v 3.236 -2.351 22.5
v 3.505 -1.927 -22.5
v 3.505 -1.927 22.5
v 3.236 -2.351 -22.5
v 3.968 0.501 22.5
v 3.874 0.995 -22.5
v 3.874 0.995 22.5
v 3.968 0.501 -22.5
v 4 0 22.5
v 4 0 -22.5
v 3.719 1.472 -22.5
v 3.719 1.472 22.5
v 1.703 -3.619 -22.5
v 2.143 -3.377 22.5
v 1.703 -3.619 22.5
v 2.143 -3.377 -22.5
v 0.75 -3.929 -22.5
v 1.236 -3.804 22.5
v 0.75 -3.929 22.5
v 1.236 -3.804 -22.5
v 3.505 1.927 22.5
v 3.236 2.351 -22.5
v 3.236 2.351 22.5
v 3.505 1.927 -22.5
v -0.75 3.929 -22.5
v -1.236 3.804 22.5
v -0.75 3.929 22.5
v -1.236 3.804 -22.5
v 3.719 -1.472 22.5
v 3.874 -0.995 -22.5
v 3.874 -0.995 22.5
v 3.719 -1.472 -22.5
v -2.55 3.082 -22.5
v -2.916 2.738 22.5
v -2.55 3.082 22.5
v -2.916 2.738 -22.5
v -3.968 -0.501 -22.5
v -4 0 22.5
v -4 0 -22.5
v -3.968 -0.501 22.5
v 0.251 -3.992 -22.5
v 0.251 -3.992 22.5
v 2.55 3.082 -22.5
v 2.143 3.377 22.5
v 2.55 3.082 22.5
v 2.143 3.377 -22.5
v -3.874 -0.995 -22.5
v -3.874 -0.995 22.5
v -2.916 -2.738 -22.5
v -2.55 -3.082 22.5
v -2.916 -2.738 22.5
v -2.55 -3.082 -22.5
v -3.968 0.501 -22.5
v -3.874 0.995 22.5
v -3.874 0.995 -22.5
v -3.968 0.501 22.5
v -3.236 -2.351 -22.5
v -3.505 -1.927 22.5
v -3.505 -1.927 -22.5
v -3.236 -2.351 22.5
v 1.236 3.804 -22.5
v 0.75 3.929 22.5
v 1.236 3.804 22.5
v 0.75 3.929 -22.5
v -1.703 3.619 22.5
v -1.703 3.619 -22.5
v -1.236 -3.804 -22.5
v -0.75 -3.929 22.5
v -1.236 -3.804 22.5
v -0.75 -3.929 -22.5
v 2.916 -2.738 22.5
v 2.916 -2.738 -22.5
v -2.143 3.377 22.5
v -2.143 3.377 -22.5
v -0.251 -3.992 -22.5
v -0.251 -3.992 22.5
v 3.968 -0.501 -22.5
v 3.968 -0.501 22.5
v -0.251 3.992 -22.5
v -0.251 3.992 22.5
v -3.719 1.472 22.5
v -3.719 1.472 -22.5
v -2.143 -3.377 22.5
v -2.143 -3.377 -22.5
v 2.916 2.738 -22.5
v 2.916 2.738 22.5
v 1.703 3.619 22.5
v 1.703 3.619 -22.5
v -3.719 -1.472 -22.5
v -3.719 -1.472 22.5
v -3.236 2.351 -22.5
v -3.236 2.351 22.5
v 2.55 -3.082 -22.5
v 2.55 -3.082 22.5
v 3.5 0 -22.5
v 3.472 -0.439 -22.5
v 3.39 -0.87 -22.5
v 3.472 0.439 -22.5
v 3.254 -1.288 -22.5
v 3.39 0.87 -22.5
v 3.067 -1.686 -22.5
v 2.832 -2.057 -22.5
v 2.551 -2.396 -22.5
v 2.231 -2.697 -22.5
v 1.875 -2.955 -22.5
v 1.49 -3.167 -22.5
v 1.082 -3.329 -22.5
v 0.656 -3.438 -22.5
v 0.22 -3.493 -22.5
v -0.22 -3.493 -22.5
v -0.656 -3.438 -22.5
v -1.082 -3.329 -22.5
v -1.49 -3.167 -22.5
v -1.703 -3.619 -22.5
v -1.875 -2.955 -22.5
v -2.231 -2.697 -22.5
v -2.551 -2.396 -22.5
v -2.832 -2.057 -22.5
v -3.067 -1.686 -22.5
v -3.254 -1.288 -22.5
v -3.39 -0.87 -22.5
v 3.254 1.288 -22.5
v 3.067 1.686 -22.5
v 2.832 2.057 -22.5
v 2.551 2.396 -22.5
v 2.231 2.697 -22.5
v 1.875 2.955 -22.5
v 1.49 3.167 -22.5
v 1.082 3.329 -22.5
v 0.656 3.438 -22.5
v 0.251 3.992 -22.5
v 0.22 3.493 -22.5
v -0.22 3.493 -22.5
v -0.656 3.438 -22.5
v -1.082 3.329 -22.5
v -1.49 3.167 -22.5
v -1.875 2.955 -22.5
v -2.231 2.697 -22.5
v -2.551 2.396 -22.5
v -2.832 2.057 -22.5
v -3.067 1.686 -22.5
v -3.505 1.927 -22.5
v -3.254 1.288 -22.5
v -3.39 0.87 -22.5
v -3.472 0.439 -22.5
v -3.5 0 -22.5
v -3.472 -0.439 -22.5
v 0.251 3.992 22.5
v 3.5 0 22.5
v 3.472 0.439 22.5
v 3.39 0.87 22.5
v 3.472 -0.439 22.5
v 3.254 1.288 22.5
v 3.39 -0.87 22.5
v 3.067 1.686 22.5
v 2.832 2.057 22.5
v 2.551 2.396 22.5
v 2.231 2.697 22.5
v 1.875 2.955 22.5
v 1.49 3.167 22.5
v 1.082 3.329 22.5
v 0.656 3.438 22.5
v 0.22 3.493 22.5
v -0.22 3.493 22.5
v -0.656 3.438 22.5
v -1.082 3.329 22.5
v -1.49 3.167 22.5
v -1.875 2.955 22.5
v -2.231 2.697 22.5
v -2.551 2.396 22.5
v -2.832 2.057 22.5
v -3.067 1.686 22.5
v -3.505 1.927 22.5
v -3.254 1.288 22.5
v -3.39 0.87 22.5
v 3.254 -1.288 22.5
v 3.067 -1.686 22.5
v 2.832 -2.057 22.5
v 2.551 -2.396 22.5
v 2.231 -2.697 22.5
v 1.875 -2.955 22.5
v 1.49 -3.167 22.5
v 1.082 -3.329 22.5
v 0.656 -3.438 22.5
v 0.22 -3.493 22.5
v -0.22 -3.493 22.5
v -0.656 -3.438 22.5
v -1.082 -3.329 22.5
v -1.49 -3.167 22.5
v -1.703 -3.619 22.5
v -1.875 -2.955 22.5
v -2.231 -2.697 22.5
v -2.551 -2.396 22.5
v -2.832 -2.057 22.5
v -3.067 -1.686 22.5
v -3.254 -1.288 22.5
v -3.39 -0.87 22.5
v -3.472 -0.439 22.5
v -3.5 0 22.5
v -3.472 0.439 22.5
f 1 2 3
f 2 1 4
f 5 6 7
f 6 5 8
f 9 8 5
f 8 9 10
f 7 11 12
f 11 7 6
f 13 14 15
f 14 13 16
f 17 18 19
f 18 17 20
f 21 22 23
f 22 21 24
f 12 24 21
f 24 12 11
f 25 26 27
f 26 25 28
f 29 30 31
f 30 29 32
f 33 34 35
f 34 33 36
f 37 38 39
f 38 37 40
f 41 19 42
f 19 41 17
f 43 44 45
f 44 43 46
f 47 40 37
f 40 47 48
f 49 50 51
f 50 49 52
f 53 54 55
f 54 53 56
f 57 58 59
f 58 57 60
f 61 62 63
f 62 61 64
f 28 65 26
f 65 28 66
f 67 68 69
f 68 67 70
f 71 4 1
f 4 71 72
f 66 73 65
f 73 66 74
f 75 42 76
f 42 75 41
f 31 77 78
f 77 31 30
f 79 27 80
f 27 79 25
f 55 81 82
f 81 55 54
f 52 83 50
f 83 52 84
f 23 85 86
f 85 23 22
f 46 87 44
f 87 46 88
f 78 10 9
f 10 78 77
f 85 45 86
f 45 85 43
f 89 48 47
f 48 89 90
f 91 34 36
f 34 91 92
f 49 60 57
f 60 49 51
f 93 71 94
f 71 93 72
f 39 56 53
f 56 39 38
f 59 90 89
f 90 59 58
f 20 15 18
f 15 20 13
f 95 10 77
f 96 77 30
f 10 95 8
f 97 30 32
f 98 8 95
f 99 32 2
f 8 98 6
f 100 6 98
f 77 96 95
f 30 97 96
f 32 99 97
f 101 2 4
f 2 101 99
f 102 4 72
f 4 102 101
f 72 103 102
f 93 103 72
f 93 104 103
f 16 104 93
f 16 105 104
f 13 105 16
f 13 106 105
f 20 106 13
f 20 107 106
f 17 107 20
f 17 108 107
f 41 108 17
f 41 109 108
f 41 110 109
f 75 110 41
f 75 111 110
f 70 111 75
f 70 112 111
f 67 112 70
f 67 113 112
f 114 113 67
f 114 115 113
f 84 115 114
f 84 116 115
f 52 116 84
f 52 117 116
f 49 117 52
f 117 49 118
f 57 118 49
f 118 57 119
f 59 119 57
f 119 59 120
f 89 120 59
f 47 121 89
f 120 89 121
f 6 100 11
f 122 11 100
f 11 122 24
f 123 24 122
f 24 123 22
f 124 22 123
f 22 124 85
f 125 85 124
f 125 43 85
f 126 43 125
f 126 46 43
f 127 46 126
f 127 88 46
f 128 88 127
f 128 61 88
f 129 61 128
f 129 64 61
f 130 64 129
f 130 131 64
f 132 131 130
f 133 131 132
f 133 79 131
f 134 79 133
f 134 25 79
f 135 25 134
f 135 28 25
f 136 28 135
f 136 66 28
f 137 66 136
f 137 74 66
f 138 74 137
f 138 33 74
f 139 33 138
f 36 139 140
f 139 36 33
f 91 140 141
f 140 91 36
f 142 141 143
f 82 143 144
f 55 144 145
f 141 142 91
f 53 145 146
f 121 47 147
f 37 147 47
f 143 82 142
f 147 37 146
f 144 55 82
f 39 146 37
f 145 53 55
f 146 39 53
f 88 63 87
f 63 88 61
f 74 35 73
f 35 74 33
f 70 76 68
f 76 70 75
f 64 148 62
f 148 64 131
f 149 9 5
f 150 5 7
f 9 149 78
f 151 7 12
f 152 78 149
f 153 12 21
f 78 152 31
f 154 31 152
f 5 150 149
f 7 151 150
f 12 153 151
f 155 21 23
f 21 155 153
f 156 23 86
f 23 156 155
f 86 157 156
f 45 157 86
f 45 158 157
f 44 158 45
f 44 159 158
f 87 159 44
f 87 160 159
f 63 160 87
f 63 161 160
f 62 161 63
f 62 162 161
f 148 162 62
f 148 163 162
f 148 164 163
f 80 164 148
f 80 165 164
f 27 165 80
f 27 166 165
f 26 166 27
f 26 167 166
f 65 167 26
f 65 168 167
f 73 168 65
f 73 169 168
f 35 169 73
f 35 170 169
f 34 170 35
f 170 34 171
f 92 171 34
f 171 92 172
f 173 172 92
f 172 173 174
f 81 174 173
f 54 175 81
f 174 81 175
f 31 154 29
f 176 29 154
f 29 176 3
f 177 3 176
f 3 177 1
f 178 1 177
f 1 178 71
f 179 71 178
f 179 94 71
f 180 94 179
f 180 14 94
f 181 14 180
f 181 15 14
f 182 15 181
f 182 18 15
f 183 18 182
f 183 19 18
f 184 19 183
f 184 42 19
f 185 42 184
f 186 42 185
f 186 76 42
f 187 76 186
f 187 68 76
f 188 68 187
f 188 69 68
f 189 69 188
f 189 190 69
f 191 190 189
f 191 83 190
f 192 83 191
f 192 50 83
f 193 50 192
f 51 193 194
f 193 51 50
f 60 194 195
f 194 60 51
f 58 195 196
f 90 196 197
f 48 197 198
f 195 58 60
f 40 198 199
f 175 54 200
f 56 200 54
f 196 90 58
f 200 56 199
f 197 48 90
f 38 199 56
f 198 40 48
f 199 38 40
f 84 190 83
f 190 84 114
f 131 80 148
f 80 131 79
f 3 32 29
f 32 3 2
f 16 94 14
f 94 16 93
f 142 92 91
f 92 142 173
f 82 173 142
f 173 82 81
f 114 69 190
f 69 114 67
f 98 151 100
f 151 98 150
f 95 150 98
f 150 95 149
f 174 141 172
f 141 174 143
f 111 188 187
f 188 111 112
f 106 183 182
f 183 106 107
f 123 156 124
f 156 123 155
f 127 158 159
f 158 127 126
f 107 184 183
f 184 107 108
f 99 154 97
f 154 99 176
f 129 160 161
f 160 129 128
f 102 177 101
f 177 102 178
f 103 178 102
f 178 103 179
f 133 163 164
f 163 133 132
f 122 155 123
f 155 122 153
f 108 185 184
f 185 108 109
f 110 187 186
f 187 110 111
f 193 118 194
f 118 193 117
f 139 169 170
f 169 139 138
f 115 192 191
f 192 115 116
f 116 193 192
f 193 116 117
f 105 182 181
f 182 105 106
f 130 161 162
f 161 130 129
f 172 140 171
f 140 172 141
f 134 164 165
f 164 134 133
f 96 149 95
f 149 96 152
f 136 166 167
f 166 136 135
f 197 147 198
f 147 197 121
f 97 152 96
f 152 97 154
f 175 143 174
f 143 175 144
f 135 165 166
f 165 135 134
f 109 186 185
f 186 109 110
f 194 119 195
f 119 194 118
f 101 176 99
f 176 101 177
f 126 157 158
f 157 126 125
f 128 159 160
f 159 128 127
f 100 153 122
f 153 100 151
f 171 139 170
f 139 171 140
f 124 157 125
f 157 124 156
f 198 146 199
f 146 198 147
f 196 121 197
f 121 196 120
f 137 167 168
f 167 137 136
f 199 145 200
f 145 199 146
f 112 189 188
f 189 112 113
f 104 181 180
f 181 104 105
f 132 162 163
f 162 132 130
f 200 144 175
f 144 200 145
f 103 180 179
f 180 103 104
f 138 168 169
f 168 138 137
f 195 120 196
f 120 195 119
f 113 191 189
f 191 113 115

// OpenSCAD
$fn = 50;


difference() {
	union() {
		translate(v = [0, 0, -22.5000000000]) {
			cylinder(h = 45, r = 4.0000000000);
		}
	}
	union() {
		translate(v = [0, 0, -100.0000000000]) {
			cylinder(h = 200, r = 3.5000000000);
		}
	}
}
